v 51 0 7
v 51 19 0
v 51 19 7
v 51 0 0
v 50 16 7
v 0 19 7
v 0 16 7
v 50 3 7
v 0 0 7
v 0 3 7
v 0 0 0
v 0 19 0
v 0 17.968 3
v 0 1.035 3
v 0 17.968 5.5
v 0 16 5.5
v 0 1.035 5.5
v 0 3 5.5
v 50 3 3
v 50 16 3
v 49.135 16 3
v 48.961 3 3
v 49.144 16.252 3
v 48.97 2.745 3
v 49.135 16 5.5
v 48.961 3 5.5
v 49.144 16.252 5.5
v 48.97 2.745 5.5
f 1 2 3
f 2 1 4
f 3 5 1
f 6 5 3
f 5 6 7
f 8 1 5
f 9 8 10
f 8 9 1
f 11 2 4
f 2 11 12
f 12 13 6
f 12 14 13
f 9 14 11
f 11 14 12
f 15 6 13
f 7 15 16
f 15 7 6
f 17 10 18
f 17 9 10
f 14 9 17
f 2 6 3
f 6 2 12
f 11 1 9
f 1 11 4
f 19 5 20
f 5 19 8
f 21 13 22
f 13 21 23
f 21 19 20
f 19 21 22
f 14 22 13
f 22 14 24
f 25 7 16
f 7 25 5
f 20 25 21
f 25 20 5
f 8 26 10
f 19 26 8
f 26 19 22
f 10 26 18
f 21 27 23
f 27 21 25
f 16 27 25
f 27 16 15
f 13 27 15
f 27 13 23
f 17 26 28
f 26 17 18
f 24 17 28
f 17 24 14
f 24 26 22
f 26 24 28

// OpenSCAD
w = 19;
h = 7;
l = 51;

s = 1;
s2 = 3;

difference() {
cube([l,w,h]);

translate([0,s2,s2])cube([l-s,w-2*s2,h-s2]);

translate([-1,w-6,s2]) rotate([0,0,-2])cube([l-s,5,2.5]);
translate([-1,1,s2]) rotate([0,0,2])cube([l-s,5,2.5]);
}
